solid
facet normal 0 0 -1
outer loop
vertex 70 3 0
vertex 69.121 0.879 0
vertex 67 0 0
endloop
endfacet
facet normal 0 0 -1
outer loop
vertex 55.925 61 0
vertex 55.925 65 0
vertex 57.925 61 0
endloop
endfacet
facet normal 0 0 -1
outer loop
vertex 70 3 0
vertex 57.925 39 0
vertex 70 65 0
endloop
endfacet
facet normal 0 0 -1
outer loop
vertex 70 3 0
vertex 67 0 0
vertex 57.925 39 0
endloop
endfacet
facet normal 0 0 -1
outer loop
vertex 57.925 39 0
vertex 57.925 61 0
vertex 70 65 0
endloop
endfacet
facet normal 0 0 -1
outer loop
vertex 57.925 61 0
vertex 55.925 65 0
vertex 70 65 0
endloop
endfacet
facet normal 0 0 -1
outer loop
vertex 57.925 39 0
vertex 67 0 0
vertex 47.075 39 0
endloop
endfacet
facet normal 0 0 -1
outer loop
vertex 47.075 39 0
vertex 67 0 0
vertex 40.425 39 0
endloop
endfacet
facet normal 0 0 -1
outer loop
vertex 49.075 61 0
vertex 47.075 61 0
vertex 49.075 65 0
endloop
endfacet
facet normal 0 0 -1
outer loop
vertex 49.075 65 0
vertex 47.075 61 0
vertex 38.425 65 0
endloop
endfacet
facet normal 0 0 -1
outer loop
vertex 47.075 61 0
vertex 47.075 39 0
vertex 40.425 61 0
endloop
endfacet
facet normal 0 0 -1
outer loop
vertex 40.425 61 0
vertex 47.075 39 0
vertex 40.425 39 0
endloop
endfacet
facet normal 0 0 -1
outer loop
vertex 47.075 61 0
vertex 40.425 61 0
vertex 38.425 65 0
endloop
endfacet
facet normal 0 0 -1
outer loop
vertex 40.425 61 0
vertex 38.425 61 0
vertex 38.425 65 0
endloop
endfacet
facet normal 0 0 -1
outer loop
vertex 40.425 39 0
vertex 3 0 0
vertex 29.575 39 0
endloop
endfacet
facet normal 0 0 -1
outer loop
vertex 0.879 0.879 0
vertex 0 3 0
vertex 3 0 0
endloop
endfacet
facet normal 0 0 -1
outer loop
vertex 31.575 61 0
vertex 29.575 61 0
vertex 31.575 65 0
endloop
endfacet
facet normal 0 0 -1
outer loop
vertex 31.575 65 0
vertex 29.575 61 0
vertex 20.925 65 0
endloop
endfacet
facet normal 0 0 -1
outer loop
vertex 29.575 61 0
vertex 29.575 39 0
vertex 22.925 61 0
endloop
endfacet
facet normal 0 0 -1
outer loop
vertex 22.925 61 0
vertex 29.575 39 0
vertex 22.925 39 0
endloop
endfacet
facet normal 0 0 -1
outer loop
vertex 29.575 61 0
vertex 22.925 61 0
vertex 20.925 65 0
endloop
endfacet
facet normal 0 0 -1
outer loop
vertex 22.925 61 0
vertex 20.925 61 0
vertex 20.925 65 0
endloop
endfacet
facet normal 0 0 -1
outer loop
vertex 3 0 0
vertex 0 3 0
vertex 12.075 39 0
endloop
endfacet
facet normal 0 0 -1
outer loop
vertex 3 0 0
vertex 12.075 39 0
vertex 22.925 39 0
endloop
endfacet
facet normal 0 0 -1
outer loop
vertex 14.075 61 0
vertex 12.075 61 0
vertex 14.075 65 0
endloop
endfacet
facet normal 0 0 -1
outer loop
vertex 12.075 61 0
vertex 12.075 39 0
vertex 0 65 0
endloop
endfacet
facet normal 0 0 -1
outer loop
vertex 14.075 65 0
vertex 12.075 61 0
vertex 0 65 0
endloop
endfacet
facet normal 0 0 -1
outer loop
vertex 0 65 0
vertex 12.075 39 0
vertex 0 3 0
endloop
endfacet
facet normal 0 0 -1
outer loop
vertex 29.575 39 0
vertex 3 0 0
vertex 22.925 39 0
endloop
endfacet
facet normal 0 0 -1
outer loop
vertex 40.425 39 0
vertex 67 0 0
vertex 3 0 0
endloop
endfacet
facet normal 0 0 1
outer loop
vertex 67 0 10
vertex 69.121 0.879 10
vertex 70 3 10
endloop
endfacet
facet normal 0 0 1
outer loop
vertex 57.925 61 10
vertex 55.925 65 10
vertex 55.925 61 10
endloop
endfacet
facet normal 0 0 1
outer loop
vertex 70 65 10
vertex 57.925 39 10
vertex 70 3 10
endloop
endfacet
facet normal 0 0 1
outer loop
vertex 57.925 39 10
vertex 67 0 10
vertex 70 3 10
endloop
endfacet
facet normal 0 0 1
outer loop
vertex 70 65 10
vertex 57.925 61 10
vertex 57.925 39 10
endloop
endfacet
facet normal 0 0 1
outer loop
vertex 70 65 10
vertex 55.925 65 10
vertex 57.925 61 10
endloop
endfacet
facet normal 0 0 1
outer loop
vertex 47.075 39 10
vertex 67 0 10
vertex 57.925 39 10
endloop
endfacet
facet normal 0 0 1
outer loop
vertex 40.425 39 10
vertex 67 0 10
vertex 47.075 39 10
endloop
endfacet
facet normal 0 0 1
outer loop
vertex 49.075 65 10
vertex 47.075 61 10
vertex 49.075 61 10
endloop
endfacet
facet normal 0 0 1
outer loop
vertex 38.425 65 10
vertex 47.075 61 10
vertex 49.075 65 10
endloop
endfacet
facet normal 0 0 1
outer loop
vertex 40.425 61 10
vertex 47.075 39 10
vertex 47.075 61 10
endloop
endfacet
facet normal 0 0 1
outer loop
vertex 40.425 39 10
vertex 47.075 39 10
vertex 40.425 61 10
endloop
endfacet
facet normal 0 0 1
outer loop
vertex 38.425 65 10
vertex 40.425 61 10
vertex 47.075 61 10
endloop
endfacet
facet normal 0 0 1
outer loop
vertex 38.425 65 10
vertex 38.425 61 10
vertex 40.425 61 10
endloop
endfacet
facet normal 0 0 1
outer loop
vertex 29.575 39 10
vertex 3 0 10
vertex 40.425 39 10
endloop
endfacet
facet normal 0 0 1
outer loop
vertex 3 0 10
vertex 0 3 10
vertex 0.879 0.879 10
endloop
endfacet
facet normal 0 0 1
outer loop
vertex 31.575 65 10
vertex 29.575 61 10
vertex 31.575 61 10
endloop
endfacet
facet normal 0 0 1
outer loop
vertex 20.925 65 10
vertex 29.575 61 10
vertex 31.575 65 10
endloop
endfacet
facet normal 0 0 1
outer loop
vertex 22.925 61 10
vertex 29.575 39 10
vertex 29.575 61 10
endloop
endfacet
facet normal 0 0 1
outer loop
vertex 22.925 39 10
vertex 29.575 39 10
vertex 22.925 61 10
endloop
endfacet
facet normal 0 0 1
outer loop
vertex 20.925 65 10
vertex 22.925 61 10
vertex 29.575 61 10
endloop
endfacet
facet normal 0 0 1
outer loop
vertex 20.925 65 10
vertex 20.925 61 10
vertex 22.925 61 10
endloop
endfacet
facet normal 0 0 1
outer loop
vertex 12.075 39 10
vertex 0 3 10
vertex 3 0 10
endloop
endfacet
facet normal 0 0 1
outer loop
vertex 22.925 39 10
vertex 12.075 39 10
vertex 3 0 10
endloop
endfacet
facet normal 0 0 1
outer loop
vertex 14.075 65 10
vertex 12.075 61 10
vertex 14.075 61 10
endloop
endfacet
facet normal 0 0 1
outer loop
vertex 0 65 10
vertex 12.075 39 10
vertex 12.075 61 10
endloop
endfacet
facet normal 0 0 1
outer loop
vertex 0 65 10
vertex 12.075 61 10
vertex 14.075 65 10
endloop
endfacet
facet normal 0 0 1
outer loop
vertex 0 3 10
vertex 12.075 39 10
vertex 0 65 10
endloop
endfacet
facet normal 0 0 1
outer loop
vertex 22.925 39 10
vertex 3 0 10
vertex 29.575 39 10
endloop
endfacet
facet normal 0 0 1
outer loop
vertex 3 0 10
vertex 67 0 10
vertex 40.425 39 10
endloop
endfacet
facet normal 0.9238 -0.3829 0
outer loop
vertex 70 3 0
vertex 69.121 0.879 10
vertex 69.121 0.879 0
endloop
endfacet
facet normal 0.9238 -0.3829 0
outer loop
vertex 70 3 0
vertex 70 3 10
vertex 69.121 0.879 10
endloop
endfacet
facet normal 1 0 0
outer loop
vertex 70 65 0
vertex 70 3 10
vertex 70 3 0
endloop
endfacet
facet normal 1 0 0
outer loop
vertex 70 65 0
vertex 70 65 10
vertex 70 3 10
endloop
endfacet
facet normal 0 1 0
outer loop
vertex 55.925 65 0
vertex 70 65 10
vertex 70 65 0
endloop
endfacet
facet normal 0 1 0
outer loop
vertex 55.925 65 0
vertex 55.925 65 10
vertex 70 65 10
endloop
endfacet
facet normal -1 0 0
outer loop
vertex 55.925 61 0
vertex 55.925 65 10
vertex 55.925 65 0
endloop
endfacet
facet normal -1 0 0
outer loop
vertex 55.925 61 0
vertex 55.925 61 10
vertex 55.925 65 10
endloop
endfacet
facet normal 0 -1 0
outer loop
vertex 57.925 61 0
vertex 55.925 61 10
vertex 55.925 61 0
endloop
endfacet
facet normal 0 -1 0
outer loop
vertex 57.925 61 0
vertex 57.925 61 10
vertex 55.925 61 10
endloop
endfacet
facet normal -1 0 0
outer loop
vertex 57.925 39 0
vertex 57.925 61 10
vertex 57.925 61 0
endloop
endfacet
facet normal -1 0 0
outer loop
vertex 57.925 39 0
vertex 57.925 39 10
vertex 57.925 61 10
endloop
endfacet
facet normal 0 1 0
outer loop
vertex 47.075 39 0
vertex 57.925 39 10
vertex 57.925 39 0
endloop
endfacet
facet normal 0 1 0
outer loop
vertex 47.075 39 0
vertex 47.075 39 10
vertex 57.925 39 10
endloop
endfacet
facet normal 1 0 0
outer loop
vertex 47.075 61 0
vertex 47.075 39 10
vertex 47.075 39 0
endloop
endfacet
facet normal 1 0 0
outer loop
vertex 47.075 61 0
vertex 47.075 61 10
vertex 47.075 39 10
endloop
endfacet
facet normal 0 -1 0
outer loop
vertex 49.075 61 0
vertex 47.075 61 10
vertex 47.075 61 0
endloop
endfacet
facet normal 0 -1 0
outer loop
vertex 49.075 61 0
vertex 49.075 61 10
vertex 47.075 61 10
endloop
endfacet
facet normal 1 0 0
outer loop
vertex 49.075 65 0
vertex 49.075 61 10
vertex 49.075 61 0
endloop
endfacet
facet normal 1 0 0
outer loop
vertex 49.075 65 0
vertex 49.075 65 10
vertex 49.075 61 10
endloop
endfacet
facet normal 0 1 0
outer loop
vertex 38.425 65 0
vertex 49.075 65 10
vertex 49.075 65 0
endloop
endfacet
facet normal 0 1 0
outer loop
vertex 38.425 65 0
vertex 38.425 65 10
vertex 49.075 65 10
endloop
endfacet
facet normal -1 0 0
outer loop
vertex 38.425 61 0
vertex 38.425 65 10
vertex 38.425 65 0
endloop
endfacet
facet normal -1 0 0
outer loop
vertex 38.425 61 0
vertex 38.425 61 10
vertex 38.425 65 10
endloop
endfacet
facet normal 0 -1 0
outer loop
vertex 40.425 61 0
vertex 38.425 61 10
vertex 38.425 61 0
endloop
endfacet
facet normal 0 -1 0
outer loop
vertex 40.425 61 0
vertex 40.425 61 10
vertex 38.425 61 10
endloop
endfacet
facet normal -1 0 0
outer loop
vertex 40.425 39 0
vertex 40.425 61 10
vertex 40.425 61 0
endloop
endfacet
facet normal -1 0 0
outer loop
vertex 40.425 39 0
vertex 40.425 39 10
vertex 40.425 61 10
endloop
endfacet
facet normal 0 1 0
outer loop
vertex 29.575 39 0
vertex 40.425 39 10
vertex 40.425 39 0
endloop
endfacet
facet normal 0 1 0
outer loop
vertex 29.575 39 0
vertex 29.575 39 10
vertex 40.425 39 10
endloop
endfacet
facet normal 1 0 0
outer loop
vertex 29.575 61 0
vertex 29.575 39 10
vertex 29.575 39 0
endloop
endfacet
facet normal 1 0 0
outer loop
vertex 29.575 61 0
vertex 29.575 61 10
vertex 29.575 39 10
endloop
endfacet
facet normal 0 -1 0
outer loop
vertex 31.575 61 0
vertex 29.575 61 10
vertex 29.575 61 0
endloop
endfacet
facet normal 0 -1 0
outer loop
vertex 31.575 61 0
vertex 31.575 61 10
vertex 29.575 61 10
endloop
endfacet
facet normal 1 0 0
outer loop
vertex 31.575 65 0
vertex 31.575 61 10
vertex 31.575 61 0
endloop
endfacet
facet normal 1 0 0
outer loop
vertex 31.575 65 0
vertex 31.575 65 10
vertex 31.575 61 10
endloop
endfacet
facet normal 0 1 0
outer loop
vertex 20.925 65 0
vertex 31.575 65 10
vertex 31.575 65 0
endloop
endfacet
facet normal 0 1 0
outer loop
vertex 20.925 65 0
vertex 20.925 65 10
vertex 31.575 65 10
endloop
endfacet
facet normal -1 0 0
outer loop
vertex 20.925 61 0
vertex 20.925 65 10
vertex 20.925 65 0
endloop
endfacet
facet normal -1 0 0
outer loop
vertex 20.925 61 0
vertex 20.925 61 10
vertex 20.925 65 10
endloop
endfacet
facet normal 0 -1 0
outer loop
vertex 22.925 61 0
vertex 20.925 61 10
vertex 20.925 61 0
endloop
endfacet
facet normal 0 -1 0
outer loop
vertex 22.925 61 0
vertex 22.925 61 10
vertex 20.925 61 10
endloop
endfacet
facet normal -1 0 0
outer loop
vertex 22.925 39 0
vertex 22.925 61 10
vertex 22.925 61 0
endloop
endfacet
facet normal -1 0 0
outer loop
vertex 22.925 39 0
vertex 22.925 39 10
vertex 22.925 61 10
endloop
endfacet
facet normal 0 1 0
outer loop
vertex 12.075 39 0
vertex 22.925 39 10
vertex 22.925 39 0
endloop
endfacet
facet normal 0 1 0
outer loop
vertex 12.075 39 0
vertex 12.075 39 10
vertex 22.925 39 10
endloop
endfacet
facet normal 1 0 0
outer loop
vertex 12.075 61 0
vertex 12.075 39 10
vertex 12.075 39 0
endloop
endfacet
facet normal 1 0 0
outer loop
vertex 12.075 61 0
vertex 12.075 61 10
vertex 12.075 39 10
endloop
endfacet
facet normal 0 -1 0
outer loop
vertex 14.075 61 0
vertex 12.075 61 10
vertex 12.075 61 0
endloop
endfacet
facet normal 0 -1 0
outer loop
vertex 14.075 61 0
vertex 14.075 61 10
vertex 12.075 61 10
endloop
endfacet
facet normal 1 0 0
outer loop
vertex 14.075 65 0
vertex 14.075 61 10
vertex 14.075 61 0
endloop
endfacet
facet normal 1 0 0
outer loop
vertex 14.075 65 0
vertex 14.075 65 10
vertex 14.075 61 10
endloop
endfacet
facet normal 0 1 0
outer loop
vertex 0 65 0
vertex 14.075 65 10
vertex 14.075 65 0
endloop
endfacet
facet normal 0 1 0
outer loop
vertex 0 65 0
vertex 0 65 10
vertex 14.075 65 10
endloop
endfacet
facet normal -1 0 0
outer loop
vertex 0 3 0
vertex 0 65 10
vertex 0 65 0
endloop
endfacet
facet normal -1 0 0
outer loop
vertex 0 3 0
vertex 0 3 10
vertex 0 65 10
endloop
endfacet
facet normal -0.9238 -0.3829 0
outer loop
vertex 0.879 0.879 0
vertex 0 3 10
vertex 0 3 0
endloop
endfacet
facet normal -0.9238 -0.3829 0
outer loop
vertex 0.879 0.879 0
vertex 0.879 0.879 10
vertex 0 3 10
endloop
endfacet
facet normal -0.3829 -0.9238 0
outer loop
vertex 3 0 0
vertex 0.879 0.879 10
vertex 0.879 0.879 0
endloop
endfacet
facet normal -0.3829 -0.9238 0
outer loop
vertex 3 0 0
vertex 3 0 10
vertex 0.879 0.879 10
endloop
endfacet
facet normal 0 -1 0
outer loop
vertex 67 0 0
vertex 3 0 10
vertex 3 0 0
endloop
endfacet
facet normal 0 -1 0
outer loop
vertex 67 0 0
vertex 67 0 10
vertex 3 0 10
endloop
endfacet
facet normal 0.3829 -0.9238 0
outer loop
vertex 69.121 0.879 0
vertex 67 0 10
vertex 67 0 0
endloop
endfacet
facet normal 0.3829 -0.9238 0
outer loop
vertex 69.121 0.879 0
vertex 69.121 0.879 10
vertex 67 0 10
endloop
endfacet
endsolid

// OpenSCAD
$fn = 32;

// ----------------------------------------------------------------------
// Window plate: 70 x 65 mm, 3 open windows
// ----------------------------------------------------------------------

// --- parameters (mm) ---
profile_height = 10;      // extrusion height
profile_points = 32;      // points of the closed outline

profile = [[0, 3], [0.879, 0.879], [3, 0], [67, 0], [69.121, 0.879], [70, 3], [70, 65], [55.925, 65], [55.925, 61], [57.925, 61], [57.925, 39], [47.075, 39], [47.075, 61], [49.075, 61], [49.075, 65], [38.425, 65], [38.425, 61], [40.425, 61], [40.425, 39], [29.575, 39], [29.575, 61], [31.575, 61], [31.575, 65], [20.925, 65], [20.925, 61], [22.925, 61], [22.925, 39], [12.075, 39], [12.075, 61], [14.075, 61], [14.075, 65], [0, 65]];  // single closed polygon, 32 points, counter clockwise

// --- the one profile operation ---
linear_extrude(height = profile_height) polygon(points = profile);
